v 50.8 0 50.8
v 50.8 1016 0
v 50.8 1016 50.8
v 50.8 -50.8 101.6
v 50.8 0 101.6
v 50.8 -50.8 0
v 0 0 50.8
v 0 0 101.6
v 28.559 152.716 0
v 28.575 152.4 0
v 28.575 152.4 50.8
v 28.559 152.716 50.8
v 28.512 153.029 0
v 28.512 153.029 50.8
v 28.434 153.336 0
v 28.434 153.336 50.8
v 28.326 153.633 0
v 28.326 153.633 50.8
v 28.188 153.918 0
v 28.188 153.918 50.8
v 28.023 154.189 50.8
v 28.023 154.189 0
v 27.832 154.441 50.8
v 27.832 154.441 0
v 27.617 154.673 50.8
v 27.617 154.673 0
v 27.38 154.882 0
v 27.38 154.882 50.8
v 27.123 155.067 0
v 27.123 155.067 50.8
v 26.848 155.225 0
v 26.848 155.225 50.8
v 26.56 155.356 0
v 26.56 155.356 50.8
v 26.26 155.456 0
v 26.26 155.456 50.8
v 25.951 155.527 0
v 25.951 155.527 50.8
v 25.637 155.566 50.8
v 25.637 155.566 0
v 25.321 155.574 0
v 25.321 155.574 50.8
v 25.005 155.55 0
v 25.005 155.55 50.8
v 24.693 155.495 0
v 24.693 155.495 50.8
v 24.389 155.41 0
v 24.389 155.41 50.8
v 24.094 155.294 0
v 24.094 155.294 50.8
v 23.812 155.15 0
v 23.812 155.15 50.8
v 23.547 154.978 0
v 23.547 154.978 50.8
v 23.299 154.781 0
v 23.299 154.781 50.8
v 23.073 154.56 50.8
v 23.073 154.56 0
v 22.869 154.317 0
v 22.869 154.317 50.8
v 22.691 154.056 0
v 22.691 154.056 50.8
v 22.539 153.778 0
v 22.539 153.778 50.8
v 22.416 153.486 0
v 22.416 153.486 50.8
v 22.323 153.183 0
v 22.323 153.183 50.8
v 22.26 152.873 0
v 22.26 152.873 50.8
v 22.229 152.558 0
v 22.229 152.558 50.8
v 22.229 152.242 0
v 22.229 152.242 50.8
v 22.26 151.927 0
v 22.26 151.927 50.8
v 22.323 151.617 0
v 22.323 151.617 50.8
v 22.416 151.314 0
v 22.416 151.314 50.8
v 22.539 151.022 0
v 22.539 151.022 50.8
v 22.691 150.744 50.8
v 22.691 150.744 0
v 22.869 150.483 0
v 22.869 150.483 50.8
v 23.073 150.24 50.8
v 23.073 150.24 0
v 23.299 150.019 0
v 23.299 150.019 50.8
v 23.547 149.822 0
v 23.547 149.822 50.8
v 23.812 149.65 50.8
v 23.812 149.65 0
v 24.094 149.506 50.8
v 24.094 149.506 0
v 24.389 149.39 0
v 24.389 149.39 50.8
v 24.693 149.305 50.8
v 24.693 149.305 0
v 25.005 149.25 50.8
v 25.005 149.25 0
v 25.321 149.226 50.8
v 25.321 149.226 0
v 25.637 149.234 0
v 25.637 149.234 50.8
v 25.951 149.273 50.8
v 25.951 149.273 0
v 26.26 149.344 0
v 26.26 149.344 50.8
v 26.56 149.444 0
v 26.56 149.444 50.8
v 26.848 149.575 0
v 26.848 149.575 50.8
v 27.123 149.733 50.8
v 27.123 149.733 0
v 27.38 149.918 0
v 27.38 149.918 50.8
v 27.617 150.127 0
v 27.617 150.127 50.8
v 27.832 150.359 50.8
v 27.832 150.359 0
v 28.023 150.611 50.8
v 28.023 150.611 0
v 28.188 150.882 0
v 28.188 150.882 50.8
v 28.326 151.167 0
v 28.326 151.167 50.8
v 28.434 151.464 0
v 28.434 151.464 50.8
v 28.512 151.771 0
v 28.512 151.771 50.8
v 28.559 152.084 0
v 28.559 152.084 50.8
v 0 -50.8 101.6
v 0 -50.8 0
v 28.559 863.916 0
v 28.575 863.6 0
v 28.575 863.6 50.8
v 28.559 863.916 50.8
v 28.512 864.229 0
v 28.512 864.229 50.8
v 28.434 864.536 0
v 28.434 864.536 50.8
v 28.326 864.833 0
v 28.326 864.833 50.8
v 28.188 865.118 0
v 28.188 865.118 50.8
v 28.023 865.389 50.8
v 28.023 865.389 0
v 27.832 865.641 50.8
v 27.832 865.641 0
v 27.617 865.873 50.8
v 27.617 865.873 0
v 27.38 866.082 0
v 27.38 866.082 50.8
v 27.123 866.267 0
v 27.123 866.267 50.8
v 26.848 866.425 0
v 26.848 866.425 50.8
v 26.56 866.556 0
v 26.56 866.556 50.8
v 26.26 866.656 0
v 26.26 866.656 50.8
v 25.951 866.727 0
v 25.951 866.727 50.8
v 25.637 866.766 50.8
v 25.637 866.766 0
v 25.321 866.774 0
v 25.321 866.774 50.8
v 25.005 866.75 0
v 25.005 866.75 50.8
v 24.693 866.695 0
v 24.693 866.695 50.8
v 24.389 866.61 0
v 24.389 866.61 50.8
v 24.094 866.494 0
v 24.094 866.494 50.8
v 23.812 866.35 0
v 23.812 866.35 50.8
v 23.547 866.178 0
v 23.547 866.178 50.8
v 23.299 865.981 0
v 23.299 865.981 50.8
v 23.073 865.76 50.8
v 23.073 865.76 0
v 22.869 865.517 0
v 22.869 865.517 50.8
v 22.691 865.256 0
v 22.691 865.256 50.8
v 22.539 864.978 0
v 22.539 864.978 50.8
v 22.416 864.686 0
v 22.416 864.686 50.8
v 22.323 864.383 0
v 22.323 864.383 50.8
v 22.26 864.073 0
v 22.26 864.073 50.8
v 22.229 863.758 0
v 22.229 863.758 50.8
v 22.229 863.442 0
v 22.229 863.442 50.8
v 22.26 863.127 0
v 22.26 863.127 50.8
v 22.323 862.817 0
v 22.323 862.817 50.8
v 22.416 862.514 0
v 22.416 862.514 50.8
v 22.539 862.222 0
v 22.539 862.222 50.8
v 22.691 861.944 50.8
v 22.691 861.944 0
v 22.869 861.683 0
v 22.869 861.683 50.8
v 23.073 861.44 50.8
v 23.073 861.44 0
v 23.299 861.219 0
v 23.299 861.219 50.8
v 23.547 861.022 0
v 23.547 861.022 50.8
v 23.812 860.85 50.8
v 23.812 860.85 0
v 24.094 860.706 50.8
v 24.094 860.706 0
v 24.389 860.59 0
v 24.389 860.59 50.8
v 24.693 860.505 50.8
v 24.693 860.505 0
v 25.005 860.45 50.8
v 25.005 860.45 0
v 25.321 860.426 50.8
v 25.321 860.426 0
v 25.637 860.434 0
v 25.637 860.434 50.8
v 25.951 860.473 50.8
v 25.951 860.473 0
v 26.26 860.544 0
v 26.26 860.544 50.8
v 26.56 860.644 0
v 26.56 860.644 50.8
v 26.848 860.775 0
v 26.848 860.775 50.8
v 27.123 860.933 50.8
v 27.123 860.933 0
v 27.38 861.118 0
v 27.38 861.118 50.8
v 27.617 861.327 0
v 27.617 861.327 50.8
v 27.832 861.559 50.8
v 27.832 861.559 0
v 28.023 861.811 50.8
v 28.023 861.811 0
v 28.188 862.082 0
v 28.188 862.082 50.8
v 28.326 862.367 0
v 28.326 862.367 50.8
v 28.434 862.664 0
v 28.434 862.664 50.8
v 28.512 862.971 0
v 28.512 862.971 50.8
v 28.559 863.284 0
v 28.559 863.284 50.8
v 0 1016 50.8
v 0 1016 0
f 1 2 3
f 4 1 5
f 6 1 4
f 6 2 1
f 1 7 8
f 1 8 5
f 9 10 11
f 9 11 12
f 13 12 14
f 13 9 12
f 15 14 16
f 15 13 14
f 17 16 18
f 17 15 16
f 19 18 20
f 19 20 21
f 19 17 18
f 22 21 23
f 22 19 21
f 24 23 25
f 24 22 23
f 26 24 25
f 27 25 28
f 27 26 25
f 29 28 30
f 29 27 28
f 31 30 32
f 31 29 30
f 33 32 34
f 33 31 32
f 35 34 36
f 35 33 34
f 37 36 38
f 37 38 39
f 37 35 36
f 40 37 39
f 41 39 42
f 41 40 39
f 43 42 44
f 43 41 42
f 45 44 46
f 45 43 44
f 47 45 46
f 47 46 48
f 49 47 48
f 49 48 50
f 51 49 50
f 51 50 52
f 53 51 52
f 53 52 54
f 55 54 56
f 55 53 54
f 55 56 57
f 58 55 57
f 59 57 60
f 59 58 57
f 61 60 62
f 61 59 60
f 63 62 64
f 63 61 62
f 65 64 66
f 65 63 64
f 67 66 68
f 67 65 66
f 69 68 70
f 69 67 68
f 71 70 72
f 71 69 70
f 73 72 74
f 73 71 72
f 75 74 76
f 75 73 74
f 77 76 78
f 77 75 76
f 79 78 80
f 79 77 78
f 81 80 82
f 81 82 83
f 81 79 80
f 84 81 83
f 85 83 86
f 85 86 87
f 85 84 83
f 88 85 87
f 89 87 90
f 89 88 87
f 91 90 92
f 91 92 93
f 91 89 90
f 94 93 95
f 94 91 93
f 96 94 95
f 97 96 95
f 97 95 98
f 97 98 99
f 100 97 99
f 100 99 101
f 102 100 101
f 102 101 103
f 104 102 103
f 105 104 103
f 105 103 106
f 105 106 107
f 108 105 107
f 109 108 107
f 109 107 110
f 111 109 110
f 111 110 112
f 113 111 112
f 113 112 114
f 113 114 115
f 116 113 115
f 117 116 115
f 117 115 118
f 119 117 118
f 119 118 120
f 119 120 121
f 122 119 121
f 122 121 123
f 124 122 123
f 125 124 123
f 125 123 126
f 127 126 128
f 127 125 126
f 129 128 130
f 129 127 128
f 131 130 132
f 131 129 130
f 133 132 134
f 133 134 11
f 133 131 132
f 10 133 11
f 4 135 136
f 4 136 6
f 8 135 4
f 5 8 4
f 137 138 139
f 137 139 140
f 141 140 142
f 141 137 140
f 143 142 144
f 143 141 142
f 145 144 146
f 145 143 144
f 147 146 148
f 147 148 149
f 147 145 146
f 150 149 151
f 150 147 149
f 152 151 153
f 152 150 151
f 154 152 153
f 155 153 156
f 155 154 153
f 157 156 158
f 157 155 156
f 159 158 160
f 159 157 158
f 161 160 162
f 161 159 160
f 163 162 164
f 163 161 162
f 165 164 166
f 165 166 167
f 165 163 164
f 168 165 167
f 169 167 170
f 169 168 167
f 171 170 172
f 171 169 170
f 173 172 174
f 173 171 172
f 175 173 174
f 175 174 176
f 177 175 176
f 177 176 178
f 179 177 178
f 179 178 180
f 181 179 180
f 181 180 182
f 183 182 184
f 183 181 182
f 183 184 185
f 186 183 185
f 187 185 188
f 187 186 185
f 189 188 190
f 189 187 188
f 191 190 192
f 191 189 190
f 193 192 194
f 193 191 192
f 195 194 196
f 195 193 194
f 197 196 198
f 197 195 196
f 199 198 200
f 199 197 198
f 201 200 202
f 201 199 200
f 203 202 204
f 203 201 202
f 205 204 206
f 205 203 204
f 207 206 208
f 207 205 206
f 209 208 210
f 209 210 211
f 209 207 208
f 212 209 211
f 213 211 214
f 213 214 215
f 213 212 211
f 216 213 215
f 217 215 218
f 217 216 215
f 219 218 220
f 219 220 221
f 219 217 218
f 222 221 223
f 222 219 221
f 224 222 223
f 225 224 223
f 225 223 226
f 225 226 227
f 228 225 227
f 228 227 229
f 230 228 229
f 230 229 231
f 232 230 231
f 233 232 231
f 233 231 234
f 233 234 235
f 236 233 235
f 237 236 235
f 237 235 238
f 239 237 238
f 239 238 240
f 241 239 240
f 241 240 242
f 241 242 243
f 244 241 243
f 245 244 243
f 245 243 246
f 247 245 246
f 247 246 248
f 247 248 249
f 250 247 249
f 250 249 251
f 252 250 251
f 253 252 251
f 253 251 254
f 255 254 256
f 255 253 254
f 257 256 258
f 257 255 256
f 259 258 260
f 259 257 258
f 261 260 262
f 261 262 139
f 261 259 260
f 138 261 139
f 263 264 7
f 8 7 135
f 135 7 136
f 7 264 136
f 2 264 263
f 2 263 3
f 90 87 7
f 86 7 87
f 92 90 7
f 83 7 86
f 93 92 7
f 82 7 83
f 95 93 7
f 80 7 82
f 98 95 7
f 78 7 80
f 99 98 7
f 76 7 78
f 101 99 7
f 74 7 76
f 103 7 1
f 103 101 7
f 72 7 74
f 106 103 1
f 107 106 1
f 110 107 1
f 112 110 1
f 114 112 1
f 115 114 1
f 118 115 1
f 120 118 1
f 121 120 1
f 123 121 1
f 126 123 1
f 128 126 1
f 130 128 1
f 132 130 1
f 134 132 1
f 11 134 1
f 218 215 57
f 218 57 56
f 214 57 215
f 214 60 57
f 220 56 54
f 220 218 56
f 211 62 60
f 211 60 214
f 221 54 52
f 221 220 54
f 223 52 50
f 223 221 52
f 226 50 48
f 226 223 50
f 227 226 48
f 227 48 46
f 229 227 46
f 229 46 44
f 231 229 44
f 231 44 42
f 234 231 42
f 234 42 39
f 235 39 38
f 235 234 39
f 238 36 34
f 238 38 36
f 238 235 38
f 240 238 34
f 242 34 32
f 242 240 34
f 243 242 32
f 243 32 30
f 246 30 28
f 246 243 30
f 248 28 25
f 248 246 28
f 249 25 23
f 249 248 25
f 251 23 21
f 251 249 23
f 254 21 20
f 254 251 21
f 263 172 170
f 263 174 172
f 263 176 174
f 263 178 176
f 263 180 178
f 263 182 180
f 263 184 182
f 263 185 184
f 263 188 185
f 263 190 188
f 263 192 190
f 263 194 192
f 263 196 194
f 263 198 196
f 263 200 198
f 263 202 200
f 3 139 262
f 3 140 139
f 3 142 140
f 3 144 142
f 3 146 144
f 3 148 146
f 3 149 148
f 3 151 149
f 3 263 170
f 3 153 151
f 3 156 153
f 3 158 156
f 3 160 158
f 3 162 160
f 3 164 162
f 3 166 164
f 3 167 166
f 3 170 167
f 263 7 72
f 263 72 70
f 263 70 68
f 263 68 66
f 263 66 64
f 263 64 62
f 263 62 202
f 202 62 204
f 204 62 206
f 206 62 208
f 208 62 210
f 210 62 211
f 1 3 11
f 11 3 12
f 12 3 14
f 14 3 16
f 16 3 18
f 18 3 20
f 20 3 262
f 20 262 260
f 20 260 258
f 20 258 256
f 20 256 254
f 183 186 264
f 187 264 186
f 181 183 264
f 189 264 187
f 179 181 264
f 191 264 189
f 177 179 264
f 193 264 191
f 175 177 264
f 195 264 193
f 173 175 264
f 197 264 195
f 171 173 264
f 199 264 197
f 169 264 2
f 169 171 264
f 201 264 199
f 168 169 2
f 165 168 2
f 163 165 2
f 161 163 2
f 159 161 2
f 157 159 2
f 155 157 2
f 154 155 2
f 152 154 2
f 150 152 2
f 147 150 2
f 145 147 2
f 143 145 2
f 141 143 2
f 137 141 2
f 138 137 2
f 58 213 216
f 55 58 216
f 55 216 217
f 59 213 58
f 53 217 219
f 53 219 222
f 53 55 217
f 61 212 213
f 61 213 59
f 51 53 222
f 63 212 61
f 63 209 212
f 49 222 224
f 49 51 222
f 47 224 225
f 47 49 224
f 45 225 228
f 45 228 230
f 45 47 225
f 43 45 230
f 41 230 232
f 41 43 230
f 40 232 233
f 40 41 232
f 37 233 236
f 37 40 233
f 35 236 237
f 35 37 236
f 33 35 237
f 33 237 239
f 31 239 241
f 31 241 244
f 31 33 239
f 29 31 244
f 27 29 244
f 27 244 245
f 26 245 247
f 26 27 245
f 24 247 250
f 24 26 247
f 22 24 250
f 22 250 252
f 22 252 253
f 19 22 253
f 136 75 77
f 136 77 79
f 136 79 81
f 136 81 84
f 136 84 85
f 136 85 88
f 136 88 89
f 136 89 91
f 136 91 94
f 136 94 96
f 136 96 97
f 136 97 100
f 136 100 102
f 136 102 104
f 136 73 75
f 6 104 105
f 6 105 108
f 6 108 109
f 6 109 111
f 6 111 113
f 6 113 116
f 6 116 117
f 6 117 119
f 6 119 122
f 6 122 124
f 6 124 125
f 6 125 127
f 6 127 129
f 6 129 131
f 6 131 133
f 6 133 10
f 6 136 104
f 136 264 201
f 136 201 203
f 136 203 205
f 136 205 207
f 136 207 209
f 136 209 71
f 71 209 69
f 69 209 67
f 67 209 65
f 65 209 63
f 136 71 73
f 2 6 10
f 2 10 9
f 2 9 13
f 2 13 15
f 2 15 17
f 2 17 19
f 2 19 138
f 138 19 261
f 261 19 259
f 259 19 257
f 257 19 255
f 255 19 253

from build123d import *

# Parameters (mm, degrees)
F0_W     = 50.8
F0_H     = 1016
F0_R     = 3.175
F1_DEPTH = 50.8
F2_W     = 50.8
F2_H     = 50.8
F3_DEPTH = 101.6


with BuildPart() as f1:
    # F0 (on Top) → F1 (new body)
    with BuildSketch(Plane.XY):
        with Locations((25.4, 508)):
            Rectangle(F0_W, F0_H)
        with Locations((25.4, 152.4)):
            Circle(F0_R, mode=Mode.SUBTRACT)
        with Locations((25.4, 863.6)):
            Circle(F0_R, mode=Mode.SUBTRACT)
    extrude(amount=F1_DEPTH)

    # F2 (on face) → F3 (join)
    with BuildSketch(Plane(origin=(0, 0, 0), x_dir=(1, 0, 0), z_dir=(0, 0, -1))):
        with Locations((25.4, 25.4)):
            Rectangle(F2_W, F2_H)
    extrude(amount=-F3_DEPTH)


solid = f1.part
